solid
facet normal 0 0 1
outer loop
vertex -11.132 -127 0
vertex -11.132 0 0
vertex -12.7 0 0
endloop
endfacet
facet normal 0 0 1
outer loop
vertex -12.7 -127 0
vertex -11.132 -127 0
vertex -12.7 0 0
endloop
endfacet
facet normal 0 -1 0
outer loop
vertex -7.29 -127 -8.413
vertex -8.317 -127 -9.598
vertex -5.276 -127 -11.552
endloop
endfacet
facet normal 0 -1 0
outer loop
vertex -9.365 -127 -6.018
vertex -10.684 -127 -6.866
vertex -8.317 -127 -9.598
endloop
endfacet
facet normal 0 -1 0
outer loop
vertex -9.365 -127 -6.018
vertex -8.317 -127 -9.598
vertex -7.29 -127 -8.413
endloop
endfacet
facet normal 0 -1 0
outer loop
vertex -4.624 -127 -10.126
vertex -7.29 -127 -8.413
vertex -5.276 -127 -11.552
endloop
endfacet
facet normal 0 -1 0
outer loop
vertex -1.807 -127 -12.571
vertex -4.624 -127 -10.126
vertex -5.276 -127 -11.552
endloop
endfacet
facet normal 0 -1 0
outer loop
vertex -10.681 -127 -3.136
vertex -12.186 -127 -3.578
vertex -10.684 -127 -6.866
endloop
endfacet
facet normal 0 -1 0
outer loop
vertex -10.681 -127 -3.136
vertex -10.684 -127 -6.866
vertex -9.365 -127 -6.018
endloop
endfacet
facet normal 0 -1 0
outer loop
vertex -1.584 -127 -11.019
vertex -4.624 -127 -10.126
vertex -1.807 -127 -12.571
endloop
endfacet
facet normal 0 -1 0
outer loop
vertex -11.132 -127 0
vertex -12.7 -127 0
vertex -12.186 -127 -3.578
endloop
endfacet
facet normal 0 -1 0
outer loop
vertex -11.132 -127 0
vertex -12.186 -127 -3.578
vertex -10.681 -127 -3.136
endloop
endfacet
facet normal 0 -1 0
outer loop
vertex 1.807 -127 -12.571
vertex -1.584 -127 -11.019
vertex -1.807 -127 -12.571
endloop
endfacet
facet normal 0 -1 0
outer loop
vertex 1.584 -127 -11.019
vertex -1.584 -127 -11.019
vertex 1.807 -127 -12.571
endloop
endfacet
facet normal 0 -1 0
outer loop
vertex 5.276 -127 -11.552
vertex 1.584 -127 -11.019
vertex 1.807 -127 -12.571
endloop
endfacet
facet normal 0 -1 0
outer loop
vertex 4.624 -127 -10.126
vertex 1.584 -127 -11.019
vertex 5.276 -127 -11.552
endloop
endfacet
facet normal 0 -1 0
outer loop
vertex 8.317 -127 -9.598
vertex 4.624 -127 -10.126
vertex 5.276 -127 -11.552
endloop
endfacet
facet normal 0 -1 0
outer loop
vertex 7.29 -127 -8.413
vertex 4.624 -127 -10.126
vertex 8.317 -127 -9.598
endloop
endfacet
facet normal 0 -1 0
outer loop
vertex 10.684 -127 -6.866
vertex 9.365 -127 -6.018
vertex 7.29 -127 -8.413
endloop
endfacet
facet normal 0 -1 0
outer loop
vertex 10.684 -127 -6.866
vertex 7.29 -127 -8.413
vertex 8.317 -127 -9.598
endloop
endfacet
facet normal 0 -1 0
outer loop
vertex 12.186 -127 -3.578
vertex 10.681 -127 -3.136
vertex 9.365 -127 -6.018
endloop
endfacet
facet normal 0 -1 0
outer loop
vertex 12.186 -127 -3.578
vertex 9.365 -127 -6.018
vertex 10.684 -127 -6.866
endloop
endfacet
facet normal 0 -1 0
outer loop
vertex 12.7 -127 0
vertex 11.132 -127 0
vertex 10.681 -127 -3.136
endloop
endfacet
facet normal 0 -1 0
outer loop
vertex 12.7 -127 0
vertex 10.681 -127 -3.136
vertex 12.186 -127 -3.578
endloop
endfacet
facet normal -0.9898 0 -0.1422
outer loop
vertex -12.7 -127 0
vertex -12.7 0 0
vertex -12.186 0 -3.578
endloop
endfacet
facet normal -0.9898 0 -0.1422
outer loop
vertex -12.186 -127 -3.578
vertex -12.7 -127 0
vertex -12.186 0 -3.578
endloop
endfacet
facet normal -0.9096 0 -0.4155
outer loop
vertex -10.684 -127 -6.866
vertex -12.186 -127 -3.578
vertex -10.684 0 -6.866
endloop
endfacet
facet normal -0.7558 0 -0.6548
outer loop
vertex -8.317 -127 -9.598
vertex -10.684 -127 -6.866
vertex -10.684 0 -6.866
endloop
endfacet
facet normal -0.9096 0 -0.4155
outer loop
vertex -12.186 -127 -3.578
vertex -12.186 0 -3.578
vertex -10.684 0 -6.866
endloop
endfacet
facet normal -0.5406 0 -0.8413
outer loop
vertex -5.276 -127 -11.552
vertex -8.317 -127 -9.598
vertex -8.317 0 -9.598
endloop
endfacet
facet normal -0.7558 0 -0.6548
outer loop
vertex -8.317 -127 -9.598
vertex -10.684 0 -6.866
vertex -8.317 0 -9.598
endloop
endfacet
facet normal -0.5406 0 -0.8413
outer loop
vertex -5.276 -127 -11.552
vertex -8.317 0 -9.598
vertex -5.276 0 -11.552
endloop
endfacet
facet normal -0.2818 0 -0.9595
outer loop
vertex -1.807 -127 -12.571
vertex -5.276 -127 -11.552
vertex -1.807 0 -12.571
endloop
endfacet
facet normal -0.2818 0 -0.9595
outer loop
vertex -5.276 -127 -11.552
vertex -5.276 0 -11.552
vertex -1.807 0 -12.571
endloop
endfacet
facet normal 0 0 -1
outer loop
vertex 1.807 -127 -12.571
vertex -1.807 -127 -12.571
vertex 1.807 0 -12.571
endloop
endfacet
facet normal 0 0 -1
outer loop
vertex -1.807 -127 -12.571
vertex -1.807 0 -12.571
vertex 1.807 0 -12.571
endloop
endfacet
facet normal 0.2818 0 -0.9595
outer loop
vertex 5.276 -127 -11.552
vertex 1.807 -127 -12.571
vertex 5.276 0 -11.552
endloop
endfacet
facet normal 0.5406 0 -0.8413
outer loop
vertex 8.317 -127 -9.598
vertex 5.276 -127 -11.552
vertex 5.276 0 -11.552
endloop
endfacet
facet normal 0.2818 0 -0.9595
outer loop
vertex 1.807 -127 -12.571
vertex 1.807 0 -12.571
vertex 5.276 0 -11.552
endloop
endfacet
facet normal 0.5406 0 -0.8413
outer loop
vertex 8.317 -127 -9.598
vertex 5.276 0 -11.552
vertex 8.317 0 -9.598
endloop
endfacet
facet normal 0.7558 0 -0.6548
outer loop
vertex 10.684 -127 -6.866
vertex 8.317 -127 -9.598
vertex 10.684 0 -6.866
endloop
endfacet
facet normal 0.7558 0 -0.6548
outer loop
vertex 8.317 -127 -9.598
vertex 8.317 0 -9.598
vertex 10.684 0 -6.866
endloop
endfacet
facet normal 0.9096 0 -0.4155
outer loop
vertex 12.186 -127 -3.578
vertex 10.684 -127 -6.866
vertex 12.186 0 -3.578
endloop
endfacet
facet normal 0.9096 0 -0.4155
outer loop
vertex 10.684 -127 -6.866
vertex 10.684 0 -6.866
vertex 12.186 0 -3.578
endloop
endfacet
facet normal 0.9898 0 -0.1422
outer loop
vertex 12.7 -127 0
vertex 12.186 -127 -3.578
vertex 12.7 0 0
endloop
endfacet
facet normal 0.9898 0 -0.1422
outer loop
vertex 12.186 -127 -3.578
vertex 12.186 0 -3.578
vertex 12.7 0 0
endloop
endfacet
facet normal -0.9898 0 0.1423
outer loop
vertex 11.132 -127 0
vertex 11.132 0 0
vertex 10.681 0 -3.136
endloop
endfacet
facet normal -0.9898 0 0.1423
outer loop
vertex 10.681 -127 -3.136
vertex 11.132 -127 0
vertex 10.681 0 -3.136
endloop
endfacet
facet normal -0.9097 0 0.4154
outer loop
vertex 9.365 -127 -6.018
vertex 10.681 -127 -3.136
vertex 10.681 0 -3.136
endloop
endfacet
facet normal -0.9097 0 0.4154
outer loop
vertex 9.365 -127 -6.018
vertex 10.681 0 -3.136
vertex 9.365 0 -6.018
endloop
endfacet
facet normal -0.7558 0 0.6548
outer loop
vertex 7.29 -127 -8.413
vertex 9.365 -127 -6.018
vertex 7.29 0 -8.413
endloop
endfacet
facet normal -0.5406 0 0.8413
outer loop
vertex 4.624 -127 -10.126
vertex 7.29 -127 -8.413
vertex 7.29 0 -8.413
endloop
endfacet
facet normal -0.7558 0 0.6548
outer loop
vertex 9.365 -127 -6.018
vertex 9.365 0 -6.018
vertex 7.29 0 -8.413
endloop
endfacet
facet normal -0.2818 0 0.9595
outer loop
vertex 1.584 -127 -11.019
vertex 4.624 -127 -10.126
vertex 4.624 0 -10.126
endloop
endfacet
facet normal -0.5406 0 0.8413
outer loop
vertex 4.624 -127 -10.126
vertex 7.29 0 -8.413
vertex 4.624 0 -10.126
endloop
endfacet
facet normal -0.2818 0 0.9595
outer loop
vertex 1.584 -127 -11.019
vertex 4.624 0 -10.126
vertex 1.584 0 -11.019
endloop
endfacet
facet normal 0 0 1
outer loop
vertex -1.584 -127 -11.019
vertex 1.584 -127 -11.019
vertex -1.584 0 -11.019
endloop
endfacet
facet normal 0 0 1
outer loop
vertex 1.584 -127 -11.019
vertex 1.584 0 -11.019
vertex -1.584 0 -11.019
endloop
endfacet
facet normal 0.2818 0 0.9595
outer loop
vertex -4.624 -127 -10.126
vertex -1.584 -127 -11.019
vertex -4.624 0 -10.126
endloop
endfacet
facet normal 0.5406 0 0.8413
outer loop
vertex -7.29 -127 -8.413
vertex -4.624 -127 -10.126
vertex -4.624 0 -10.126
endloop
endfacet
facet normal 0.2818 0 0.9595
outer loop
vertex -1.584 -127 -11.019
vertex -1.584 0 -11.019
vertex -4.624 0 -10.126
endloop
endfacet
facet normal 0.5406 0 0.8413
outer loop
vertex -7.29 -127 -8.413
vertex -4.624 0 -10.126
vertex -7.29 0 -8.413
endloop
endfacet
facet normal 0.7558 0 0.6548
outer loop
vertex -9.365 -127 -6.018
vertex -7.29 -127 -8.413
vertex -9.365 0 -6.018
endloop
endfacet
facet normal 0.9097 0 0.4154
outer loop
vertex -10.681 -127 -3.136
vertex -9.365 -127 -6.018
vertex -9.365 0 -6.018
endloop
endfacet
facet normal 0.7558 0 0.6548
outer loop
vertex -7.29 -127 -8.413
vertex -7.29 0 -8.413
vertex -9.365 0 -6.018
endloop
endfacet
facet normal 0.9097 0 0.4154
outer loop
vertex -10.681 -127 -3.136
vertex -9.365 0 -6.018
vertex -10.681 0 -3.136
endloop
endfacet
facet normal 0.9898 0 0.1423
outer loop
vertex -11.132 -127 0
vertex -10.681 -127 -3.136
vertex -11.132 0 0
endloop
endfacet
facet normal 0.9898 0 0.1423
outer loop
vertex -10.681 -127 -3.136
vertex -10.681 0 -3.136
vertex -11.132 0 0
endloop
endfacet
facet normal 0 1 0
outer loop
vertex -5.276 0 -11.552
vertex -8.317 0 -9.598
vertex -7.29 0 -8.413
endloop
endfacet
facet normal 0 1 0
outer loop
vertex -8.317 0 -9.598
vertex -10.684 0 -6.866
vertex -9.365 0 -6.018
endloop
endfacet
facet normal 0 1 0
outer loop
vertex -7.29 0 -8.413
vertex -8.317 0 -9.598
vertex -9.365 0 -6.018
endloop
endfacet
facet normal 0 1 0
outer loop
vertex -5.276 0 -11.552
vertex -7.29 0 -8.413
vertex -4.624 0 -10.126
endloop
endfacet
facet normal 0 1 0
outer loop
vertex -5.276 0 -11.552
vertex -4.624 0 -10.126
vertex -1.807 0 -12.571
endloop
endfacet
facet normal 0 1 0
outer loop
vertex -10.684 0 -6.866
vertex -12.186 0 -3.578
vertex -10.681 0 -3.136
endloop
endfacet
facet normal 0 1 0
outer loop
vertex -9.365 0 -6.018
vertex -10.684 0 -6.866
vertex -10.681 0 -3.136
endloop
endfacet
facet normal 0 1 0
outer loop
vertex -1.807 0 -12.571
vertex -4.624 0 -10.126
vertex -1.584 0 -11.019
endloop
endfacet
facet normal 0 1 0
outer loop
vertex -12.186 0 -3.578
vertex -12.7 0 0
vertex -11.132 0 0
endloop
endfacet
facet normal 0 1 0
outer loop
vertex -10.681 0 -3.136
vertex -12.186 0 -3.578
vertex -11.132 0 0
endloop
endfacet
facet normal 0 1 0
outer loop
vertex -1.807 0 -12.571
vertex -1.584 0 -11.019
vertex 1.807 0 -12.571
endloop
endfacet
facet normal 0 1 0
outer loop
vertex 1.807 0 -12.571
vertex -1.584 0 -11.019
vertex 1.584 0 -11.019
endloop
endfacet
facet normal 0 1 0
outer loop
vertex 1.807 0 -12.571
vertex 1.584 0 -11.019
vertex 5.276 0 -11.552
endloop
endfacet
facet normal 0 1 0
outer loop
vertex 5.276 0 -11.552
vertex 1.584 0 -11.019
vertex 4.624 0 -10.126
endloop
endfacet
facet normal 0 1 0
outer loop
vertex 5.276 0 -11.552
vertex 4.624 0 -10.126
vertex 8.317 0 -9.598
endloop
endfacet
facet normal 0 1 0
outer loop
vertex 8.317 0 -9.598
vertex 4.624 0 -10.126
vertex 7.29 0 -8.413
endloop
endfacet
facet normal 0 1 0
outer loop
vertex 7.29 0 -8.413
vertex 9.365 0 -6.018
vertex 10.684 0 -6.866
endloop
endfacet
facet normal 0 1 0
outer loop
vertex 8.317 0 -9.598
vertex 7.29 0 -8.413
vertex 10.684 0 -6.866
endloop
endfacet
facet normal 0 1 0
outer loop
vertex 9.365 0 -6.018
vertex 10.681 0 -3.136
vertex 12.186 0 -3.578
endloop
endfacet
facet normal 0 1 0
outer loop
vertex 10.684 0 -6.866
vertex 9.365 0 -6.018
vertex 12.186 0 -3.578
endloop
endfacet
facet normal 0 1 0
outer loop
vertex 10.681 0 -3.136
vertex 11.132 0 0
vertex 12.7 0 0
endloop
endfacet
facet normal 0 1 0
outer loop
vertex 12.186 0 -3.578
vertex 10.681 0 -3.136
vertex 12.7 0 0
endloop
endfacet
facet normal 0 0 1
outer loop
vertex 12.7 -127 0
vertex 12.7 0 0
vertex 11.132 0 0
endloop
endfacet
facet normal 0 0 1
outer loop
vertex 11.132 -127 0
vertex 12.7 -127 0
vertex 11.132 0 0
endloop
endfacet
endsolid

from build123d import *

# Parameters (mm, degrees)
F1_DEPTH = 127
F2_R     = 11.1125
F3_DEPTH = 127
F4_R     = 11.132084
F5_DEPTH = 409.90812


with BuildPart() as f1:
    # F0 (on Front) → F1 (new body)
    with BuildSketch(Plane.XZ):
        with BuildLine():
            Line((12.7, 0), (-12.7, 0))
            ThreePointArc((-12.7, 0), (0, -12.7), (12.7, 0))
        make_face()
    extrude(amount=F1_DEPTH)

    # F2 (on Front) → F3 (join)
    with BuildSketch(Plane.XZ):
        Circle(F2_R)
    extrude(amount=F3_DEPTH)

    # F4 (on face) → F5 (cut)
    with BuildSketch(Plane(origin=(0, 0, 0), x_dir=(-1, 0, 0), z_dir=(0, 1, 0))):
        Circle(F4_R)
    extrude(amount=-F5_DEPTH, mode=Mode.SUBTRACT)


solid = f1.part
